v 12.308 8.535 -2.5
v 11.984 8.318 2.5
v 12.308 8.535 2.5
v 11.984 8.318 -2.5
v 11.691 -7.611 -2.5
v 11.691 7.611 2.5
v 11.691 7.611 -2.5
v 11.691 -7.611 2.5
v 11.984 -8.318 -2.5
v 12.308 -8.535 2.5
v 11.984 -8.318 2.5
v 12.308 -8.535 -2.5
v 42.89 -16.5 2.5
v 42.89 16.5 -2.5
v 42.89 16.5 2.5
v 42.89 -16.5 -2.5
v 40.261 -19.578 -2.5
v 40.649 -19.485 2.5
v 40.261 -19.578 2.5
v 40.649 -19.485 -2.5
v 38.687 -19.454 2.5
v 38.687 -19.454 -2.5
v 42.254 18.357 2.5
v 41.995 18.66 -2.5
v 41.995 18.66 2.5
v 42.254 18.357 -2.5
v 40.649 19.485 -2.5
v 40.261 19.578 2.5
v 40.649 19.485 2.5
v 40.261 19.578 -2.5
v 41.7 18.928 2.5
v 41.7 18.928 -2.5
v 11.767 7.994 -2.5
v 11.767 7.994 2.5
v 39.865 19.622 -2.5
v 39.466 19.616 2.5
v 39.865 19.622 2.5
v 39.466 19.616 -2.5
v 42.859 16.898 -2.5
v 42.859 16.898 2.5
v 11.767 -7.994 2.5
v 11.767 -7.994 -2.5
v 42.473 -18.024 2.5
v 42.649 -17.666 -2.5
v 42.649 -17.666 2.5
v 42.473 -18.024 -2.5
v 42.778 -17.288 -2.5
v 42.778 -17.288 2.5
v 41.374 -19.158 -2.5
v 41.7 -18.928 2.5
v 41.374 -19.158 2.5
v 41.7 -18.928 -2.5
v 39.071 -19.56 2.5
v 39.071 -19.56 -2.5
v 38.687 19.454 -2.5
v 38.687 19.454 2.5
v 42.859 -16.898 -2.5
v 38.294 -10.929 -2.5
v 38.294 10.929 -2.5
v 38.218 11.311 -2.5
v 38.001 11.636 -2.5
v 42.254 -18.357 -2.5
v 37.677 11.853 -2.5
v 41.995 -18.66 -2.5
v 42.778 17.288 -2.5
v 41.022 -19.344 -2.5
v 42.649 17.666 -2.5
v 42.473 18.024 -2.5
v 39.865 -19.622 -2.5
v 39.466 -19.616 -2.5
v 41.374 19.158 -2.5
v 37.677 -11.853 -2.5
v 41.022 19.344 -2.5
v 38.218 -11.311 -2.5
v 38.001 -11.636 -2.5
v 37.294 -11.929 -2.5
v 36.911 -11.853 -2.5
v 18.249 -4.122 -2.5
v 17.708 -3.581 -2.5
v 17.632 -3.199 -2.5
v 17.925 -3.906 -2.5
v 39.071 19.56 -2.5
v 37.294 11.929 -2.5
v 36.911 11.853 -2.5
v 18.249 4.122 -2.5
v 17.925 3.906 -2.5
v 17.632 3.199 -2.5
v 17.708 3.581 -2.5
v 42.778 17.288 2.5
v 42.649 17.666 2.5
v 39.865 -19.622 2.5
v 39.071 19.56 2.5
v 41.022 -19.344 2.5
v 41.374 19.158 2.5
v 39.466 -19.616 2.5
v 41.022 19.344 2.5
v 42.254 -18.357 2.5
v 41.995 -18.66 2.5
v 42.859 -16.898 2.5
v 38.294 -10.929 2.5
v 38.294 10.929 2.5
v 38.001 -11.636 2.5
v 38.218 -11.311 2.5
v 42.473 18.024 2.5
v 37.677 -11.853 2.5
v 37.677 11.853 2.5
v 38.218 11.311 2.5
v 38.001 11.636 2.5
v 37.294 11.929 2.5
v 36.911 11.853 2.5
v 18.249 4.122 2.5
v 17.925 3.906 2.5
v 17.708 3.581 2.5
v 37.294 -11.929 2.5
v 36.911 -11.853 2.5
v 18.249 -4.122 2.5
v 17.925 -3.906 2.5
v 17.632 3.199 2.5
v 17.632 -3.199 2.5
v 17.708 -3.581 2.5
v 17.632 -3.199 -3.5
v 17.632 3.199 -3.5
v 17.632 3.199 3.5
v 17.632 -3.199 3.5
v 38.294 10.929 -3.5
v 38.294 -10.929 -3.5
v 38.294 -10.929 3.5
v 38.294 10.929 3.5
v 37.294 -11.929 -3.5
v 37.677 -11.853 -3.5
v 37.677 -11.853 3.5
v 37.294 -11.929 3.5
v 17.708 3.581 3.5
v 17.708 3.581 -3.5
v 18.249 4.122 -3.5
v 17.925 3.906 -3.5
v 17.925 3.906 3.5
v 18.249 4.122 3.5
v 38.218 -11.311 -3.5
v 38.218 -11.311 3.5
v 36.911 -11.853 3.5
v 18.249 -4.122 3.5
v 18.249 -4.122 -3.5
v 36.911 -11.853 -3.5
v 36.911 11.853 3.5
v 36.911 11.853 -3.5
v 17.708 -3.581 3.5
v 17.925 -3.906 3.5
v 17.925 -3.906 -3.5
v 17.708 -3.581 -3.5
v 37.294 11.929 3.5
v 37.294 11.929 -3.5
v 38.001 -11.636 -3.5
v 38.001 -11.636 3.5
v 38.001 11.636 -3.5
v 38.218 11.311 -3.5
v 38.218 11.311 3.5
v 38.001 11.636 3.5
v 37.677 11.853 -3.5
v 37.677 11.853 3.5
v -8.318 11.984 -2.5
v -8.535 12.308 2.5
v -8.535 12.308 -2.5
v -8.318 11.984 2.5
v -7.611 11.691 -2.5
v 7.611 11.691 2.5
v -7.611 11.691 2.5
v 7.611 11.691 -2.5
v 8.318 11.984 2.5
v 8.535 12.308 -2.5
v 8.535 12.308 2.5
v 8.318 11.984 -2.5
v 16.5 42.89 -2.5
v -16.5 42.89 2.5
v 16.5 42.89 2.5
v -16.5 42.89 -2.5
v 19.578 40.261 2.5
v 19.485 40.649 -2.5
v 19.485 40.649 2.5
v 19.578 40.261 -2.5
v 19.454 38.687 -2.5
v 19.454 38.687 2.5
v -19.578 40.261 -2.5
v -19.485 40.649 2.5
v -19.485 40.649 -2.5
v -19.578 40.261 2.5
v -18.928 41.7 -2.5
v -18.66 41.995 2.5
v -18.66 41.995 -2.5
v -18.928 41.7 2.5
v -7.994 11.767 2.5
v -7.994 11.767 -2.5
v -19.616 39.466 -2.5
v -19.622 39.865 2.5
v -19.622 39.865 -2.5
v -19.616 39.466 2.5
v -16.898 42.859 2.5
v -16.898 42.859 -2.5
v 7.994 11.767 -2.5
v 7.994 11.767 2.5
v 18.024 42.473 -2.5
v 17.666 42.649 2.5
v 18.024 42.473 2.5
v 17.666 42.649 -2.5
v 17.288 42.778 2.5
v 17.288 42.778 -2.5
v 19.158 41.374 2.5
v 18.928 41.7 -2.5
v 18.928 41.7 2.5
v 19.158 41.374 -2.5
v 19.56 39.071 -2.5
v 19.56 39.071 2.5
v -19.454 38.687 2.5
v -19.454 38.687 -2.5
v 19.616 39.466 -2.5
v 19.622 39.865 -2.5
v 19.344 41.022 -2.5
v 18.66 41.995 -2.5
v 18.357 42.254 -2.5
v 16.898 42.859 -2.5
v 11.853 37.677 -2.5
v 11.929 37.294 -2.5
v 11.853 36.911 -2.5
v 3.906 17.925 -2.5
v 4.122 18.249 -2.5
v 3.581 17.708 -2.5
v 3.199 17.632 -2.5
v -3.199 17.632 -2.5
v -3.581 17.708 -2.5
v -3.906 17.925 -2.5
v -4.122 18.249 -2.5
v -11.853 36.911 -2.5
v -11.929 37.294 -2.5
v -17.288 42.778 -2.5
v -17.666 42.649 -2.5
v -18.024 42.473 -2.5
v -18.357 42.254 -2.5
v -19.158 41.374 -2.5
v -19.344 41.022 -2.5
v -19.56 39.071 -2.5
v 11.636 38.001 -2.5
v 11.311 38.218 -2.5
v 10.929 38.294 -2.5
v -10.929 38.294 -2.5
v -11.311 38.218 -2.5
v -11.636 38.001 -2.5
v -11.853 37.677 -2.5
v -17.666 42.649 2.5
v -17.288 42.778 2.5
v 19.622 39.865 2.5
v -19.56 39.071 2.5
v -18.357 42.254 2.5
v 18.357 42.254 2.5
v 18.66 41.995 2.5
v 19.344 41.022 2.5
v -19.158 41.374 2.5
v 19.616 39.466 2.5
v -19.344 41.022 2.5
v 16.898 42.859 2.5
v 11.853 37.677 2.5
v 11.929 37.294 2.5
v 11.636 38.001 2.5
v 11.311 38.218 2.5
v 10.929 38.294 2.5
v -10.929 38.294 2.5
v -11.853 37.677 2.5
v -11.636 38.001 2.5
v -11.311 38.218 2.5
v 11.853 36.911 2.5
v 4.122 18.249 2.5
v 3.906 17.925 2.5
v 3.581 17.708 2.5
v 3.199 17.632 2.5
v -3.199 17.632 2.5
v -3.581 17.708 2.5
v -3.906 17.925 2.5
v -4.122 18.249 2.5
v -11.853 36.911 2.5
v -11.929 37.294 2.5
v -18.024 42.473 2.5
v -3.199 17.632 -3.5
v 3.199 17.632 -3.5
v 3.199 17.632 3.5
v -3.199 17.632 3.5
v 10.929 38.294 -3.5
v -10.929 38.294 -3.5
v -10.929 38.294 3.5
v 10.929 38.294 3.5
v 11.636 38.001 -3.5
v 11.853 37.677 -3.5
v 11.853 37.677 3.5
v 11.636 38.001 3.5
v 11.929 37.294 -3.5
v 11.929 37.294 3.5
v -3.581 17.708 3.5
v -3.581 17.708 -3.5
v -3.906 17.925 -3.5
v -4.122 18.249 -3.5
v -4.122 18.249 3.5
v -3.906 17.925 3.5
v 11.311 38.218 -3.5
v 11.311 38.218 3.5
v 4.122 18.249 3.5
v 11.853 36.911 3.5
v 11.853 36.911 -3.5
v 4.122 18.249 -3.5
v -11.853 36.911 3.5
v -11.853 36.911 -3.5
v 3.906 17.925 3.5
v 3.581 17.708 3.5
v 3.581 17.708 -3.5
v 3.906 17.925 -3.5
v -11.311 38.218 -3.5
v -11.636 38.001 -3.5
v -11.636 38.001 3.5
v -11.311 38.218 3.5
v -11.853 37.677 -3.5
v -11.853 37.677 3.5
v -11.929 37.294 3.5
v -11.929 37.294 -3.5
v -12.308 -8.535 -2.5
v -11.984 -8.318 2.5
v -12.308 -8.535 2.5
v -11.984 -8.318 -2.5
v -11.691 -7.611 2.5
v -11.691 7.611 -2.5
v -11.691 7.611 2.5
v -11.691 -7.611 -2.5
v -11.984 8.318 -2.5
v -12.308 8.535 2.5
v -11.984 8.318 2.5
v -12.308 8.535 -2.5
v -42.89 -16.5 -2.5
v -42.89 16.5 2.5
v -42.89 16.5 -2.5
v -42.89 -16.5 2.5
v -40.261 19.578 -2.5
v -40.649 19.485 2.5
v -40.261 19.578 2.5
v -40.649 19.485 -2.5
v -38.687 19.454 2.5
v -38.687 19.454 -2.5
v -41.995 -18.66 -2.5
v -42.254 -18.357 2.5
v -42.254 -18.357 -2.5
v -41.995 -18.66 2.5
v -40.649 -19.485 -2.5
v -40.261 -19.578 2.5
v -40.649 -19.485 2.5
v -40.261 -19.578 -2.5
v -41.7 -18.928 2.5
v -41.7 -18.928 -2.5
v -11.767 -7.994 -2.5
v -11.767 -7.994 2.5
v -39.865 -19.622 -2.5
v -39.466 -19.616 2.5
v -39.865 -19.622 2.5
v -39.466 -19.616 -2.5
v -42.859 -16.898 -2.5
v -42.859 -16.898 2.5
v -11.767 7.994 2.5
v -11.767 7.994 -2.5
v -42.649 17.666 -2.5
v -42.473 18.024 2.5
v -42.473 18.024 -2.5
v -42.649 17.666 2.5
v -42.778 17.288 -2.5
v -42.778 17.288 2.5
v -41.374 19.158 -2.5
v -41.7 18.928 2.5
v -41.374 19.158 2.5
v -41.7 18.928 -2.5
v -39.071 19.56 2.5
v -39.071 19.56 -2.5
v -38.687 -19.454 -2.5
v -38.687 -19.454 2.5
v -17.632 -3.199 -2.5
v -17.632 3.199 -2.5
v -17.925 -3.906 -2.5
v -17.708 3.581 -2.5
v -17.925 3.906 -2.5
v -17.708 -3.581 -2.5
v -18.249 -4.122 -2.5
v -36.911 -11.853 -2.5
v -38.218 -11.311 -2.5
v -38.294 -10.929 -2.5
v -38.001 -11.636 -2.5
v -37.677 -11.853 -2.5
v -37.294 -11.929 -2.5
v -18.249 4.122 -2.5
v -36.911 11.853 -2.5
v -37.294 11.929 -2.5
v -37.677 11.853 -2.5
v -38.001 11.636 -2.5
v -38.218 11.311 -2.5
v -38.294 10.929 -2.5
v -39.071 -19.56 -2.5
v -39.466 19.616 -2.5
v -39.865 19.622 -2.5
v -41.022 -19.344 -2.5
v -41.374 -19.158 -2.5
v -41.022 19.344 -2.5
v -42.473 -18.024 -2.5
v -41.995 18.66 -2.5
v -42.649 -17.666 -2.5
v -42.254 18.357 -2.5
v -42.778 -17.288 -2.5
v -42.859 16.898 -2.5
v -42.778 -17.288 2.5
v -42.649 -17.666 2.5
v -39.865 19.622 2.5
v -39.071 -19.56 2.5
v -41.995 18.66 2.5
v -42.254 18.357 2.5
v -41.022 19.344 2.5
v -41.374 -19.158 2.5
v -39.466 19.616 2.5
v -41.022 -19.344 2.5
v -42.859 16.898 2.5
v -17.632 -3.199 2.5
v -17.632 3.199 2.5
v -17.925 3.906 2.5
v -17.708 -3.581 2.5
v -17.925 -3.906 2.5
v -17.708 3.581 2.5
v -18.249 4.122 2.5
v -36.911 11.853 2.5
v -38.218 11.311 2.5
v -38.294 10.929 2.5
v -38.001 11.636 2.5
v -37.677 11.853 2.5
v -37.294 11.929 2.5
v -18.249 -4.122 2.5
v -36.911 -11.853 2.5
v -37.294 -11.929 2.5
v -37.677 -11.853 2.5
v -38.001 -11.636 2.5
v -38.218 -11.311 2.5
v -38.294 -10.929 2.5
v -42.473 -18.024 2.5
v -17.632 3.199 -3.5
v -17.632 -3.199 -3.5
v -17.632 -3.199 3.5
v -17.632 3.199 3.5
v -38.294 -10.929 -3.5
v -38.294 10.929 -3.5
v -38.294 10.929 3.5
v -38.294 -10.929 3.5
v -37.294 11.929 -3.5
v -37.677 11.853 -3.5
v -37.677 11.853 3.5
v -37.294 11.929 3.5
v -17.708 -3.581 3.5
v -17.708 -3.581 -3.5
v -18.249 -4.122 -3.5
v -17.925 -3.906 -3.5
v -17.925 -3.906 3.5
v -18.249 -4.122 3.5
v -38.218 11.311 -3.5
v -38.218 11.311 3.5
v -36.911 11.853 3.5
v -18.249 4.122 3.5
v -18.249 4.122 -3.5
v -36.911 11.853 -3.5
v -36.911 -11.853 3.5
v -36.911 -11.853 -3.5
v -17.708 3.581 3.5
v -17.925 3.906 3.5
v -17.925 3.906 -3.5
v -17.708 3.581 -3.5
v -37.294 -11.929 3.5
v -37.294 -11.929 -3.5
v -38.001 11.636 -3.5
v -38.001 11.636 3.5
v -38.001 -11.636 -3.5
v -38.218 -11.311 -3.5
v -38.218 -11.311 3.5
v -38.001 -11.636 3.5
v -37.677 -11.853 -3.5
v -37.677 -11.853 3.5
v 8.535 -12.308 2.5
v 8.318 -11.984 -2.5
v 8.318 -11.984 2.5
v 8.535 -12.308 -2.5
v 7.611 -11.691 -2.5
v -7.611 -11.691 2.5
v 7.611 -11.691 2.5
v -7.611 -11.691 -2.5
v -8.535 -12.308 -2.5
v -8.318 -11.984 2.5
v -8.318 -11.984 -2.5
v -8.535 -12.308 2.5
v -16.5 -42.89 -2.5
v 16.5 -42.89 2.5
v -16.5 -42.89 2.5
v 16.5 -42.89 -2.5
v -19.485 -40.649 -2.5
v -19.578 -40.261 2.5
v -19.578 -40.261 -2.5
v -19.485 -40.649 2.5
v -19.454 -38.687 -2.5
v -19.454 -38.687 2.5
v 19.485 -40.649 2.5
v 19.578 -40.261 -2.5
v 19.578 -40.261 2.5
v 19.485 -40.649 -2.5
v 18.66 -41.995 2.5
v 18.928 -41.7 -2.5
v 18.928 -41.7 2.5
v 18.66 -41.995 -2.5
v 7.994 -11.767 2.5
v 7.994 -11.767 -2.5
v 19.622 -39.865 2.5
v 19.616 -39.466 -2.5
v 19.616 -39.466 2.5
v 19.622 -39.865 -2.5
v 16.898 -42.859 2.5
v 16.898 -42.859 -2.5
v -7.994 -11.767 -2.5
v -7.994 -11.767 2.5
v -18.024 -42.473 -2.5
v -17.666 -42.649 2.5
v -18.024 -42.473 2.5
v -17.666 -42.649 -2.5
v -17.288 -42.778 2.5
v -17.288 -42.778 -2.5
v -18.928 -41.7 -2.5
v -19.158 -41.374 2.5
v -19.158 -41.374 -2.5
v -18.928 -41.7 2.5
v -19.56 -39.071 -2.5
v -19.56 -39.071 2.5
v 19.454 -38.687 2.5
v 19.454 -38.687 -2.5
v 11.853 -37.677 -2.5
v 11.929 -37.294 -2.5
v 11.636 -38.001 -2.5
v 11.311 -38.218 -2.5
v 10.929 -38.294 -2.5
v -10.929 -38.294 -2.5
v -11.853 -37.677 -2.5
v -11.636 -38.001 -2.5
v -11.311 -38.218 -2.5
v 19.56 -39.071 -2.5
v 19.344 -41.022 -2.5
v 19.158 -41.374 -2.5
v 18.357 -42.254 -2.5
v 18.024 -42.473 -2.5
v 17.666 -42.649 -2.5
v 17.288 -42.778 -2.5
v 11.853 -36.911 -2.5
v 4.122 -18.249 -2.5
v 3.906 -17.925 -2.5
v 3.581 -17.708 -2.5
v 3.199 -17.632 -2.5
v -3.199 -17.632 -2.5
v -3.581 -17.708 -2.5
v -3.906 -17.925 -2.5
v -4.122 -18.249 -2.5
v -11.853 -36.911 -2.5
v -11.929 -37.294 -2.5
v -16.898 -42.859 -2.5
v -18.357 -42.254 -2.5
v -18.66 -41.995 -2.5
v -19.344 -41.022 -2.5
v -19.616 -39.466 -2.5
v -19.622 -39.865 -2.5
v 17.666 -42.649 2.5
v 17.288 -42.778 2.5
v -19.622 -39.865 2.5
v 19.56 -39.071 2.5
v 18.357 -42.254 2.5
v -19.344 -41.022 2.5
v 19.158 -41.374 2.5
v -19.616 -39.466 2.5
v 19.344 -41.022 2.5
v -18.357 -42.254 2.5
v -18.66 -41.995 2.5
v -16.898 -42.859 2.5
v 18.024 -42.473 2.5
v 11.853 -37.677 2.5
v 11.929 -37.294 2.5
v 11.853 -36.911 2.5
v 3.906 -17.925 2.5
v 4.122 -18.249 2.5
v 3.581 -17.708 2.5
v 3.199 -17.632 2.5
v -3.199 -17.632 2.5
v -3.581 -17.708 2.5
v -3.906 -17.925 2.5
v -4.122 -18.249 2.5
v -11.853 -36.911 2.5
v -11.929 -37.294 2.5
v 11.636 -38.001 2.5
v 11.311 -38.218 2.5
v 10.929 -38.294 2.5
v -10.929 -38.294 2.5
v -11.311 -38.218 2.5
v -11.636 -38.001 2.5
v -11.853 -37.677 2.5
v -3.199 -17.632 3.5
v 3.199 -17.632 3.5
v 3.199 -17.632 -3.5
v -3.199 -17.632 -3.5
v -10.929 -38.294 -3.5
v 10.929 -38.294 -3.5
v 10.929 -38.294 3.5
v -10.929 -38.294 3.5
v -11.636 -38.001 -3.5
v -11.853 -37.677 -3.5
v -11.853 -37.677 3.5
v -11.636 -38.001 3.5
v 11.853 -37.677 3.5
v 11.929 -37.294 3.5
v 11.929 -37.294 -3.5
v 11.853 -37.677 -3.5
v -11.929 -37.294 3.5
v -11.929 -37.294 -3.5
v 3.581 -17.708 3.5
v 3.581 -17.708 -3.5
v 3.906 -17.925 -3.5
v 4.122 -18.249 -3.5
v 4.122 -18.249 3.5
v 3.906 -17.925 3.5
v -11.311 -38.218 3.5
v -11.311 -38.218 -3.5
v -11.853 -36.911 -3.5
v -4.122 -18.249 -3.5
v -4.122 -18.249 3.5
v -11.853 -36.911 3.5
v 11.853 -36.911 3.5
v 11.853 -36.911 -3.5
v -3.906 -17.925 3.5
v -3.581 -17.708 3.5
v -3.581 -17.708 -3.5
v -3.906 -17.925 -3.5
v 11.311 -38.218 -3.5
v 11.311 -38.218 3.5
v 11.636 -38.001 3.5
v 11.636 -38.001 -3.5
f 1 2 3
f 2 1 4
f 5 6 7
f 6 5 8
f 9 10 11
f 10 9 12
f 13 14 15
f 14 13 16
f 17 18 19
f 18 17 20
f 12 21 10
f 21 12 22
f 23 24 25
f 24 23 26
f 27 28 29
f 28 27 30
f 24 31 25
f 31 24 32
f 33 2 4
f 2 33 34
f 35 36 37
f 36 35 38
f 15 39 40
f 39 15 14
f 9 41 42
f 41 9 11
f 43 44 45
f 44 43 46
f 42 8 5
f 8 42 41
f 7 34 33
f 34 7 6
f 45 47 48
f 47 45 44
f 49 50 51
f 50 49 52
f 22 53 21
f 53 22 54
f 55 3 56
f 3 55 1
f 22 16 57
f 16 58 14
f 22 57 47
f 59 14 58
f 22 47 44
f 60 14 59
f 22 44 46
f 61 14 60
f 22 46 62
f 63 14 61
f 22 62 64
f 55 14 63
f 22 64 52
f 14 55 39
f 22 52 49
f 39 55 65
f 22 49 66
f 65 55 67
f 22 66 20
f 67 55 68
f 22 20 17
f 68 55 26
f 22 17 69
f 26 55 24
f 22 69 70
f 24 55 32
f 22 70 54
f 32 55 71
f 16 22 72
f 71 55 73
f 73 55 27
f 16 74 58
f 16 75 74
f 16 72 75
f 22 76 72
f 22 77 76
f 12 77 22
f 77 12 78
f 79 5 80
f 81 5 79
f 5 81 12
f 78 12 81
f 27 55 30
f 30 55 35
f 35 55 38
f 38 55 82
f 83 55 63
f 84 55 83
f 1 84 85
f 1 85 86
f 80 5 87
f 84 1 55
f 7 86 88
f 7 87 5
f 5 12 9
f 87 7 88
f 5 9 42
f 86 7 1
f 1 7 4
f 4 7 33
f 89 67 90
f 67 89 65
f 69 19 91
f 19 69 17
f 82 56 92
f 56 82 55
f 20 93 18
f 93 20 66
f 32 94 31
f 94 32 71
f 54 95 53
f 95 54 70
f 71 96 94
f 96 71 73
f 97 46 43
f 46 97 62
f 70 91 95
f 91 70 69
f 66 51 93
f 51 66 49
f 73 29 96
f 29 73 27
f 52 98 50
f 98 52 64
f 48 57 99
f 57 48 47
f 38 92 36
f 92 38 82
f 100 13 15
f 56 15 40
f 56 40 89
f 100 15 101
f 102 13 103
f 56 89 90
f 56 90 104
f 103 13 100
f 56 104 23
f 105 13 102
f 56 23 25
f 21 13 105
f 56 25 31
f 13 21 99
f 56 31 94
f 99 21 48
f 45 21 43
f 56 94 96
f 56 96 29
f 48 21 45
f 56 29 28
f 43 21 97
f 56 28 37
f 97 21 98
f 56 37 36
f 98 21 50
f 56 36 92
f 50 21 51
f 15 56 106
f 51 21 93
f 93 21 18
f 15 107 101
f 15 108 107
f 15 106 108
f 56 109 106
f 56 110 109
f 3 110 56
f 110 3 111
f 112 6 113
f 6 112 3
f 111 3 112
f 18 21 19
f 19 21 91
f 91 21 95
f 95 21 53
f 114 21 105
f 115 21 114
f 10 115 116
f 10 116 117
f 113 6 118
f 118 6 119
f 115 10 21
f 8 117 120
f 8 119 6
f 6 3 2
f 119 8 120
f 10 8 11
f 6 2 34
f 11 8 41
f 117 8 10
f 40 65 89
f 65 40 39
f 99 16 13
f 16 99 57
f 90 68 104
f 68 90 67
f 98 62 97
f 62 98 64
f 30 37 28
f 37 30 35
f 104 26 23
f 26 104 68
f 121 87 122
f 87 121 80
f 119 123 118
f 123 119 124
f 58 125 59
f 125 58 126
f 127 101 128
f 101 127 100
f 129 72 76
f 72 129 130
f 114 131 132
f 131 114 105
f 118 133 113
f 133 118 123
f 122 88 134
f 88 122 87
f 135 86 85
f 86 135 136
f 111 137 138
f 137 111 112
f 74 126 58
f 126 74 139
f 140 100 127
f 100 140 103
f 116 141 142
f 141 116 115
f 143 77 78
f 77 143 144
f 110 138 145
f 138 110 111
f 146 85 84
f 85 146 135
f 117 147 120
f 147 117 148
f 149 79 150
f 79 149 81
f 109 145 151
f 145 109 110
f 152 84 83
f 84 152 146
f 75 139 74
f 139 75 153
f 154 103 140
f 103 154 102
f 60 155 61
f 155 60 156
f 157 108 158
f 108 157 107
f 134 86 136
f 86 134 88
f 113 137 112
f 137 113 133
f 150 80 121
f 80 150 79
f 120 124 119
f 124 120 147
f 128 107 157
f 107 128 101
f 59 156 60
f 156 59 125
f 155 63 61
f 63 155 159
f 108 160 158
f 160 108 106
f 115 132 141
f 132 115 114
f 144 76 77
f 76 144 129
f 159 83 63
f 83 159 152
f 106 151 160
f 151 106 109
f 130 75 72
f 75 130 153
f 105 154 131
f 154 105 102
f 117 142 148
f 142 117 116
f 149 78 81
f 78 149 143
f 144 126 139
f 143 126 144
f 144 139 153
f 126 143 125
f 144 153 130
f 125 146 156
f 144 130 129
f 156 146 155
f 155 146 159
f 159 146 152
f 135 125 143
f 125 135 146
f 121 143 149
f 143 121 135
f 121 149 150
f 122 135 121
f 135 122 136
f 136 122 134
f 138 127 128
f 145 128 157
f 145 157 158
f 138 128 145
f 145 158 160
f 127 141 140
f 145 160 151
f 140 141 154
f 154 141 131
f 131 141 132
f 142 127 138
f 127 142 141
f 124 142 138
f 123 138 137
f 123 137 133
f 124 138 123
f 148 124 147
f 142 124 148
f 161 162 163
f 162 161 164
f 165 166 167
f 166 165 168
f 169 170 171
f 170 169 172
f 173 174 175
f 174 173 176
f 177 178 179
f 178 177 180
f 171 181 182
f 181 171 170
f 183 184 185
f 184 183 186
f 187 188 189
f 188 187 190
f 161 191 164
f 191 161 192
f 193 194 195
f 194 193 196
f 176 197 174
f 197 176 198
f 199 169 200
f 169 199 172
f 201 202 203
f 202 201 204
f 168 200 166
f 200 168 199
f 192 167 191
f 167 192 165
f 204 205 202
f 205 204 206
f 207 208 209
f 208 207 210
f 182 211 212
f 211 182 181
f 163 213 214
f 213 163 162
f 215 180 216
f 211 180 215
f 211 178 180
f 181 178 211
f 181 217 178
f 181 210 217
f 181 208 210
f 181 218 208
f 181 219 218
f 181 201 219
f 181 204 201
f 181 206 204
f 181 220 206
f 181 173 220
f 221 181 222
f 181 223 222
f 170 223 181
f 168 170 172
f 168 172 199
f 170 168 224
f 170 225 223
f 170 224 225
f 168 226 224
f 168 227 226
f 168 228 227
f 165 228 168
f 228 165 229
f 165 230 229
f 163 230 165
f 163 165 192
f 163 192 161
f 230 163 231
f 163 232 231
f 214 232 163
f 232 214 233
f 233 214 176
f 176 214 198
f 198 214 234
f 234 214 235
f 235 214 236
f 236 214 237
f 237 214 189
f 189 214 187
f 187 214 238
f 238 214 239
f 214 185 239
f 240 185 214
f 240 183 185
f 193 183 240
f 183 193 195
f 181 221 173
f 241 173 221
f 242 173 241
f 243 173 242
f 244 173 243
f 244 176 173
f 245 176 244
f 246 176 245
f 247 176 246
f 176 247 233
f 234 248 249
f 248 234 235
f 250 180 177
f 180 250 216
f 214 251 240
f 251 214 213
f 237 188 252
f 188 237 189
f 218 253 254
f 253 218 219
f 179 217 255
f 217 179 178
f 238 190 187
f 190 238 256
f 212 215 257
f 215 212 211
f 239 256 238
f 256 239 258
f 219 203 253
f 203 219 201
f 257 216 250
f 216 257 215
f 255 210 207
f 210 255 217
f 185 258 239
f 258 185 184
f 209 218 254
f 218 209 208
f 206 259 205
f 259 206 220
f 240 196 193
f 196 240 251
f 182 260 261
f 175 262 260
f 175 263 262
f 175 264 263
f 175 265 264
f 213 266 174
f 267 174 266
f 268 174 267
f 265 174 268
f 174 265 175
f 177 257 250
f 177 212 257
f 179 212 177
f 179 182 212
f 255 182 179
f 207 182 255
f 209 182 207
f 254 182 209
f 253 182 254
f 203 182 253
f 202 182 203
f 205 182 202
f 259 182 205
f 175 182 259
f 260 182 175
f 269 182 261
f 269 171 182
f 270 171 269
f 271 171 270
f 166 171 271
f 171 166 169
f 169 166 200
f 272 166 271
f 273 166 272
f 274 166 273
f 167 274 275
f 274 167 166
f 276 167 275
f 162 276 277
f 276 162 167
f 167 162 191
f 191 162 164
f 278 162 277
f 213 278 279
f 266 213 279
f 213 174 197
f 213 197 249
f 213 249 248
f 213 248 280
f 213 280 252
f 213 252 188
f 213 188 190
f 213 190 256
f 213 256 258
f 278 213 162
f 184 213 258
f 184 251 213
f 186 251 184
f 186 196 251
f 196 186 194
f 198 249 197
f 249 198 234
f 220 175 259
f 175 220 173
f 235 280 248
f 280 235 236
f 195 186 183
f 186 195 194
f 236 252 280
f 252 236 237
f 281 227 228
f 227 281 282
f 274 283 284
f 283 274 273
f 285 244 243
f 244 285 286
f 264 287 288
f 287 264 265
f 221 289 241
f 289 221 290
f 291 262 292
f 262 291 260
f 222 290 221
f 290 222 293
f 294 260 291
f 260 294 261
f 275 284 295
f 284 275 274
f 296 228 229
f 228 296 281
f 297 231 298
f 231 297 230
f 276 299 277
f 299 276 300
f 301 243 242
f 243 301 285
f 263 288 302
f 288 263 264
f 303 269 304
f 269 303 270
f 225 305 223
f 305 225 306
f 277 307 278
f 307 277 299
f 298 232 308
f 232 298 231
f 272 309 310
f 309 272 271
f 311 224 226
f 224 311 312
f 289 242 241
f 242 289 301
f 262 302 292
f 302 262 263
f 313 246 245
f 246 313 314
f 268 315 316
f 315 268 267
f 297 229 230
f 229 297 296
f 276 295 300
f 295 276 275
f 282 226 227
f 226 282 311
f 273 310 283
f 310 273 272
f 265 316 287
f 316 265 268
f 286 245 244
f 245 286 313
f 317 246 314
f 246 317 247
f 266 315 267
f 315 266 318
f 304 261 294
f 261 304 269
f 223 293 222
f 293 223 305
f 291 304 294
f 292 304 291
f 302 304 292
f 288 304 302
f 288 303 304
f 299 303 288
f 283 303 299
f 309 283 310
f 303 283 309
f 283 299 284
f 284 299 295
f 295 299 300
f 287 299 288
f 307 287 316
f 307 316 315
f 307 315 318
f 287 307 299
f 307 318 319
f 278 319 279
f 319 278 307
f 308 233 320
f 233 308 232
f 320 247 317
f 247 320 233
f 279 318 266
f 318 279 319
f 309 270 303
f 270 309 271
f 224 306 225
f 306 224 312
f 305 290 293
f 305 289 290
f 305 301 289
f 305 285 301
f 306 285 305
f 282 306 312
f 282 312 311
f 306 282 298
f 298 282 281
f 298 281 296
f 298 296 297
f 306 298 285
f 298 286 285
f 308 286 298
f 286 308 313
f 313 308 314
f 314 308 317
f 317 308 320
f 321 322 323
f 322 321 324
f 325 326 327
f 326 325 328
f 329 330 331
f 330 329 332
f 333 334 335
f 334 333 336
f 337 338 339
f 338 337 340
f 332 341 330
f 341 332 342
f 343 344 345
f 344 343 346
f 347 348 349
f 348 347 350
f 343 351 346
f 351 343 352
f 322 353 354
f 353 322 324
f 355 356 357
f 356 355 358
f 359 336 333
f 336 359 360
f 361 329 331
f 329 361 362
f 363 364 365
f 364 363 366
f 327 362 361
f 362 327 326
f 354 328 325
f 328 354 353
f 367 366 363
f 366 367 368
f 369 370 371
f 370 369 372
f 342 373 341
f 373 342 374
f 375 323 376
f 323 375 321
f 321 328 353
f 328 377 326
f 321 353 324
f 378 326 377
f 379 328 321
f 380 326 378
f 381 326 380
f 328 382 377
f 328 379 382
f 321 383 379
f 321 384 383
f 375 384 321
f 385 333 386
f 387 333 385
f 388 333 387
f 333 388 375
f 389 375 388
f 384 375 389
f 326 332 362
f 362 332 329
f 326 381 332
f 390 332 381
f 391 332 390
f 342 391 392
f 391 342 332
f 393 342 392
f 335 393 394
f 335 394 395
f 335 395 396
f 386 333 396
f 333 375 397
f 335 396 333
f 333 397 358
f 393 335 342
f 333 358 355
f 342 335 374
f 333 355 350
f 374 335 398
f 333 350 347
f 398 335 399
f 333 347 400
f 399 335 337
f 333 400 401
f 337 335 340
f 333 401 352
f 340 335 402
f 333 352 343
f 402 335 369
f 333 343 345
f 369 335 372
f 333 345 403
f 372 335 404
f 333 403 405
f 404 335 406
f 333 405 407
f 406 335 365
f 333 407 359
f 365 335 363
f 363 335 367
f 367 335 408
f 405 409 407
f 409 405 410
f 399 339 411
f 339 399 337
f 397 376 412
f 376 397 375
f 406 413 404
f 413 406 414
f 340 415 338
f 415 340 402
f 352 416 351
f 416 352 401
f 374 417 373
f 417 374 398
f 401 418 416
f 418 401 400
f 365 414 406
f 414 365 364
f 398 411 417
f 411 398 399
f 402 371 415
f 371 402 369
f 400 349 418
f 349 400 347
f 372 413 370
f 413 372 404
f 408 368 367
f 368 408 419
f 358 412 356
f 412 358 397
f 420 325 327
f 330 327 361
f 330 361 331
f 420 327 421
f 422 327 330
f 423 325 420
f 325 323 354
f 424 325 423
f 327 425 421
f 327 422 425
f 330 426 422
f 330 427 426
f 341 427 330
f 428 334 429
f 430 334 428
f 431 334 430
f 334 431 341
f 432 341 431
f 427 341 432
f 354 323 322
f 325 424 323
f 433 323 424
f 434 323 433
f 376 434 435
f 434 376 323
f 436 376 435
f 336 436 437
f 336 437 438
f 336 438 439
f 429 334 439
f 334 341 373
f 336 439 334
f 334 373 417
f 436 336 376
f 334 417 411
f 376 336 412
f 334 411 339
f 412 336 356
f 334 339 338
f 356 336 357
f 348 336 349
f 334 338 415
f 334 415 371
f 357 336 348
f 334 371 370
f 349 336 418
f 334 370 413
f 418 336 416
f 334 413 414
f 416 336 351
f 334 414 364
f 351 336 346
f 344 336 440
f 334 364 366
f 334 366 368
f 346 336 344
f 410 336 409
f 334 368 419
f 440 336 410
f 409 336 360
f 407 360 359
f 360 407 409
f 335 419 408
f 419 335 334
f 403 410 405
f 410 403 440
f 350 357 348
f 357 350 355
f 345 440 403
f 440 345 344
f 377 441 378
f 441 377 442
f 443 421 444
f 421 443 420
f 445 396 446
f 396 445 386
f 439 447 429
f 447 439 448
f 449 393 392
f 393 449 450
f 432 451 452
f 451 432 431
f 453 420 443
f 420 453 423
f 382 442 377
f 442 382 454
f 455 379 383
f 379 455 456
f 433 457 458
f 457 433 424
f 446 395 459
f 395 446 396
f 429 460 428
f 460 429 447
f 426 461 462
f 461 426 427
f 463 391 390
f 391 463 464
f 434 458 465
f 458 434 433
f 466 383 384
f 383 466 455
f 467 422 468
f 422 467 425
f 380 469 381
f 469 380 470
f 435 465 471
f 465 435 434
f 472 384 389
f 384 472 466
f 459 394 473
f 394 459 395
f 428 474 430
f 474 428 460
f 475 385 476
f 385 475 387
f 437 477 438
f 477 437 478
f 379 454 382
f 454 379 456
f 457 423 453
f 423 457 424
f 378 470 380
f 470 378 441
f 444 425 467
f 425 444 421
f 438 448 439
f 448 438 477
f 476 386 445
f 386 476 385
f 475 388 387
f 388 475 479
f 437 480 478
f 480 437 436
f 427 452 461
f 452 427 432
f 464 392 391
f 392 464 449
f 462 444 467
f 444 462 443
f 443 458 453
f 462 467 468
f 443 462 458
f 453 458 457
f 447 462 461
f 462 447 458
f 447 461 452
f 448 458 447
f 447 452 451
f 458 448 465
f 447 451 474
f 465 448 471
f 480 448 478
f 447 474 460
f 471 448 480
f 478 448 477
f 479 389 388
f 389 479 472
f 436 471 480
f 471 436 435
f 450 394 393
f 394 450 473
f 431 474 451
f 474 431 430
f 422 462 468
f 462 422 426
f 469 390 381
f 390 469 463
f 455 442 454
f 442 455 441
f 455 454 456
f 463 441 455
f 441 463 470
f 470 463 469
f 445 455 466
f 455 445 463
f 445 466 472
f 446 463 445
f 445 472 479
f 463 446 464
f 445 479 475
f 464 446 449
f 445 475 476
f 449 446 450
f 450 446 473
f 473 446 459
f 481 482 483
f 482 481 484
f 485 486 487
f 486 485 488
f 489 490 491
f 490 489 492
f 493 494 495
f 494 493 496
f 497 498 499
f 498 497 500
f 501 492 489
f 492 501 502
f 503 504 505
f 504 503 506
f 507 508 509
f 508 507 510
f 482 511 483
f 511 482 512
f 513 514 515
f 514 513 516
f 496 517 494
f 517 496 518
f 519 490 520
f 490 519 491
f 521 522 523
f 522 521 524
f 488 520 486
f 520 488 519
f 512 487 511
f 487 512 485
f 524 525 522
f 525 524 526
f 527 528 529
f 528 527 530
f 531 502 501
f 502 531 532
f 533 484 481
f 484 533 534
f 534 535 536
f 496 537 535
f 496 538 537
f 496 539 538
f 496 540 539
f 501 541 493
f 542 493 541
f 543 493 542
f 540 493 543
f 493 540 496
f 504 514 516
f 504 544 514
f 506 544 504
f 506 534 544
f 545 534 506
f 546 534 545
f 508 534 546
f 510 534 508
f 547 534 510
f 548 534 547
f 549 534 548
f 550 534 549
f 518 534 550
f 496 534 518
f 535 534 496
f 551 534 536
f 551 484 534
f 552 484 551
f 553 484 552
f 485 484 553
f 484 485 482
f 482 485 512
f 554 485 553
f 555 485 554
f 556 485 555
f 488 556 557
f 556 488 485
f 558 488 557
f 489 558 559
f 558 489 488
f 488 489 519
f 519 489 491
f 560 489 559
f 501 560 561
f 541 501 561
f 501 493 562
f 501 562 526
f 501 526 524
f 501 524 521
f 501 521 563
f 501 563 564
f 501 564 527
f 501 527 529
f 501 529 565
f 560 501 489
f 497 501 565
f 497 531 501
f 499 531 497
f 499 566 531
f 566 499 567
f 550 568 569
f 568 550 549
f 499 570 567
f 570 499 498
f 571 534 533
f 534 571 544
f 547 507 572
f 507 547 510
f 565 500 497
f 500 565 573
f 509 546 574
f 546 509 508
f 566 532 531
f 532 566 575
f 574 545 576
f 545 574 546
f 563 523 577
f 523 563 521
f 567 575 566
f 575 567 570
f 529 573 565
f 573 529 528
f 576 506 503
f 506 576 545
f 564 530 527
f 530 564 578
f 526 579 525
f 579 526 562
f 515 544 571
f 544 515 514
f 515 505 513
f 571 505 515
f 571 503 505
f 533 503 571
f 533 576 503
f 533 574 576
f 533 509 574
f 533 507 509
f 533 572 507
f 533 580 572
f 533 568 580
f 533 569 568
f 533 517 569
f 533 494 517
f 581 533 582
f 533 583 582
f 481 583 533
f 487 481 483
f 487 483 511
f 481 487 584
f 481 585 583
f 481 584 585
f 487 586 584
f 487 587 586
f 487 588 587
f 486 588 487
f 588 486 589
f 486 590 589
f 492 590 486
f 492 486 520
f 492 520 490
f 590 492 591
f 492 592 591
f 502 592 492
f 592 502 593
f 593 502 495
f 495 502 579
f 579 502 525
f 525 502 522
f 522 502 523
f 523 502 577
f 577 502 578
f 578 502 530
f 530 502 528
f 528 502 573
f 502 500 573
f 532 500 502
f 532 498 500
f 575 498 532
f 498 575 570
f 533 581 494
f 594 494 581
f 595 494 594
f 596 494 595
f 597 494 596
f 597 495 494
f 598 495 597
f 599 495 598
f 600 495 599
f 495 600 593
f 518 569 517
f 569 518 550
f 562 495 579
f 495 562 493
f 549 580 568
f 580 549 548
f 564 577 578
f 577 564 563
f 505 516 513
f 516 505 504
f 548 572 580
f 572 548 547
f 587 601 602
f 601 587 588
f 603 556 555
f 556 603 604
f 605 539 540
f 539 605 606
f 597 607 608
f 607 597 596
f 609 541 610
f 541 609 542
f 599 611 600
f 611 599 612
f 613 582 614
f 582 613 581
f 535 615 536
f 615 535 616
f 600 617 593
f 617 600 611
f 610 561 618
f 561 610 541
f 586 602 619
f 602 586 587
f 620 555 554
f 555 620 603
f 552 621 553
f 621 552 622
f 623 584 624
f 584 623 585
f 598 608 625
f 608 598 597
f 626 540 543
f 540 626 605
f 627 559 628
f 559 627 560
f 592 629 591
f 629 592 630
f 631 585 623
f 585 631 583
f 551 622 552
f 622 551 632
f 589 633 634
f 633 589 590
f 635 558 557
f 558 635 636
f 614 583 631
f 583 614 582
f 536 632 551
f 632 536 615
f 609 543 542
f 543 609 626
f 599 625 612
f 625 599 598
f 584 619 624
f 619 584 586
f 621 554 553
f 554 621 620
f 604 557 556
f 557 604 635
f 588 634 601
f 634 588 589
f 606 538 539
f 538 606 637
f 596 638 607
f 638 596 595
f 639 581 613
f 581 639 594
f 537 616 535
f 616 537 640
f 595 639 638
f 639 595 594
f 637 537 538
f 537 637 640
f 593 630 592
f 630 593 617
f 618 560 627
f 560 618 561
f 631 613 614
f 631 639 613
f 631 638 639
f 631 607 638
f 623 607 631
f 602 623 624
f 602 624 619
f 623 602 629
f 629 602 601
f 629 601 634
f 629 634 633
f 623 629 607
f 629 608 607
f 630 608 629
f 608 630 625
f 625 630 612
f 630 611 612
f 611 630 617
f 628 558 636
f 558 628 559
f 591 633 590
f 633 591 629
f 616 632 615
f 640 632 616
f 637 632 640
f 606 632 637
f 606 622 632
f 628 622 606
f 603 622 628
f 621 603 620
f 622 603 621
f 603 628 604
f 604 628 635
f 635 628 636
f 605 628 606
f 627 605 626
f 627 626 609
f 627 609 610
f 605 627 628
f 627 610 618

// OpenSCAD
include <MCAD/bearing.scad>

// ---------------------------
// Constants
// ---------------------------
$fa = 1;
$fs = 0.4;
in_to_mm = 25.4;
gap = 1.25; //1/32 * in_to_mm;
nut_gap = 7;//3/4 * in_to_mm;
eps = .2;

bearingModel = 688; //608
bearing_w = bearingWidth(bearingModel);
bearing_or = bearingOuterDiameter(bearingModel)/2;
bearing_ir = bearingInnerDiameter(bearingModel)/2;

// ---------------------------
// Variables
// ---------------------------
num_holes=8;
sectors = num_holes;
sector_degrees = 360 / sectors;

mag1_hole_d = (1/4 * in_to_mm);
mag1_hole_r = (mag1_hole_d/2);
mag1_w = 1/4 * in_to_mm;

mag2_hole_d = (1/8 * in_to_mm);
mag2_hole_r = (mag2_hole_d/2);
mag2_w = 1/4 * in_to_mm;

mag_space_1 = 3;
mag_space_2 = 2;

cir = num_holes*2*(mag1_hole_d-mag_space_2/2);
temp_r = cir/(3.14159*2);
min_r = bearing_or + mag1_hole_d + mag2_hole_d + mag_space_2+2;
central_r3 = max(temp_r, min_r);
central_r2 = central_r3 + mag2_hole_r + mag_space_2 + mag2_hole_r;
central_r = central_r2 + mag2_hole_r + mag_space_1 + mag1_hole_r;
disk_r = central_r+2;

coil_w = bearing_w;//5;//(1/8 * in_to_mm = 3.175);
coil_hole_r = mag1_hole_r*3;
coil_hole_d = coil_hole_r*2;
coil_holder_r = mag1_hole_r;
coil_holder_bolt_r = 2;
coil_center_hole_r = bearing_or+.2; //7

coil_holder_hull_r = 1;
coil_holder_out_r1 = central_r3-mag1_hole_r-mag2_hole_r-mag_space_2;
coil_holder_out_x1 = coil_holder_out_r1-coil_holder_hull_r/num_holes;
coil_holder_out_y1 = mag1_hole_r-coil_holder_hull_r;
coil_holder_out_r2 = central_r+mag1_hole_d+mag_space_1;
coil_holder_out_x2 = coil_holder_out_r2+mag1_hole_r-coil_holder_hull_r*4;
coil_holder_out_y2 = mag1_hole_r-coil_holder_hull_r;

coil_holder_in_x1 = coil_holder_out_r1+mag1_hole_r+coil_holder_hull_r/2;
coil_holder_in_y1 = mag1_hole_r+coil_holder_hull_r;
coil_holder_in_x2 = coil_holder_out_r2-mag1_hole_r-coil_holder_hull_r*2;
coil_holder_in_y2 = mag1_hole_r+coil_holder_hull_r;
coil_holder_in_len = coil_holder_in_x2 - coil_holder_in_x1 + coil_holder_hull_r*2;
echo(str("coil_holder_in_len:", coil_holder_in_len));

base_d = 100;
base_r = base_d/2;  //central_r + coil_hole_d;
base_w = 3; //bearing_w/1.75
base_l = 70; //3.5 * in_to_mm; 66.4
base_lc = nut_gap + gap + mag2_w + gap + coil_w +gap + mag1_w + gap + coil_w + gap + mag1_w + gap + coil_w + gap + mag2_w + gap + nut_gap;
base_side_h = 15;
alignment_bolt_r = 3.9/2;

axel_h = gap+coil_w+gap;
axel_ir = bearing_ir+.1;
axel_or = coil_center_hole_r-1;

echo(str("sector_degrees:", sector_degrees));
echo(str("coil_w:", coil_w));
echo(str("bearing_w:", bearing_w));
echo(str("mag1_w:", mag1_w));
echo(str("mag1_hole_r:", mag1_hole_r));
echo(str("mag2_hole_r:", mag2_hole_r));
echo(str("coil_hole_r:", coil_hole_r));
echo(str("coil_holder_r:", coil_holder_r));
echo(str("axel_h:", axel_h));
echo(str("axel_ir:", axel_ir));
echo(str("base_lc:", base_lc));

//translate([0,0, mag1_w/2+2]) coilHoldersVisual();
//translate([0,0, -mag1_w]) mag1Disk();
//coilDisk();
//coilHolder();
//baseEndCap();
//baseBottom();
//generatorBase();
//alignmentBoltHoles();
//baseEndCap2();
//baseBottom();
%coilDisk2();
inv_num_holes = 1/num_holes;
tmp_t = inv_num_holes*2; //0=blue, 1=white, 2=yellow, 3=green
rotate([0,0,(-sector_degrees/(num_holes/2))*$t*num_holes]) {
//rotate([0,0,(-sector_degrees/(num_holes/2))*tmp_t*num_holes]) {    
    %mag1Disk();
}


tr1=inv_num_holes*1;//3/num_holes;//0.0;//0.125;
color( "yellow", 1.0 ) {
rotate([0,0,(-sector_degrees/2)*tr1*num_holes]) {    
    for(sector = [0 : 2 : sectors]) {
        rotate([0,0,sector_degrees*sector]) { 
            outerCoilHolder();
            #innerCoilHolder(w=coil_w+2);
        }
    }    
}
}
//tr2=inv_num_holes*0.5;
//color( "white", 1.0 ) {
//rotate([0,0,(-sector_degrees/2)*tr2*num_holes]) {    
//    for(sector = [0 : 2 : sectors]) {
//        rotate([0,0,sector_degrees*sector]) { 
//            outerCoilHolder();
//            #innerCoilHolder(w=coil_w+2);
//        }
//    }    
//}
//}
//tr3=inv_num_holes*2;
//color( "blue", 1.0 ) {
//rotate([0,0,(-sector_degrees/2)*tr3*num_holes]) {    
//    for(sector = [0 : 2 : sectors]) {
//        rotate([0,0,sector_degrees*sector]) { 
//            outerCoilHolder();
//            #innerCoilHolder(w=coil_w+2);
//        }
//    }    
//}
//}
//tr4=inv_num_holes*1.5;
//color( "green", 1.0 ) {
//rotate([0,0,(-sector_degrees/2)*tr4*num_holes]) {    
//    for(sector = [0 : 2 : sectors]) {
//        rotate([0,0,sector_degrees*sector]) { 
//            outerCoilHolder();
//            #innerCoilHolder(w=coil_w+2);
//        }
//    }    
//}
//}

// Outer coil holder
module outerCoilHolder(w=coil_w) {
    hull() {
        translate([coil_holder_out_x1, -coil_holder_out_y1, 0])
        cylinder(h=w,r=coil_holder_hull_r,center=true);
        translate([coil_holder_out_x2, 0, 0])
        cylinder(h=w,r=mag1_hole_r,center=true);

        rotate([0,0,sector_degrees]) {
        translate([coil_holder_out_x1, coil_holder_out_y1, 0])
        cylinder(h=w,r=coil_holder_hull_r,center=true);
        translate([coil_holder_out_x2, 0, 0])
        cylinder(h=w,r=mag1_hole_r,center=true);
        }
    }
}


// Inner coil holder
module innerCoilHolder(w=coil_w) {
    hull() {
        translate([coil_holder_in_x1, coil_holder_in_y1, 0])
        cylinder(h=w,r=coil_holder_hull_r,center=true);
        translate([coil_holder_in_x2, coil_holder_in_y2, 0])
        cylinder(h=w,r=coil_holder_hull_r,center=true);

        rotate([0,0,sector_degrees]) {
        translate([coil_holder_in_x1, -coil_holder_in_y1, 0])
        cylinder(h=w,r=coil_holder_hull_r,center=true);
        translate([coil_holder_in_x2, -coil_holder_in_y2, 0])
        cylinder(h=w,r=coil_holder_hull_r,center=true);
        }
    }
}




render_mode = "JOE"; //"FULL", "PRINT", "TEST";
print_mode = "COIL"; //"MAG1","MAG2","COIL","BASE", "BOTTOM", "END","AXEL","HOLDERS";

// Main rendering code
if (render_mode=="FULL") {
    renderFull();
} else if (render_mode=="PRINT") {
    renderPrint();
} else if (render_mode=="TEST") {
    renderTest();
}

module renderFull() {
    x_offset_1 = coil_w/2 + gap + mag1_w/2;
    x_offset_2 = x_offset_1 + mag1_w/2 + gap + coil_w/2;
    x_offset_3 = x_offset_2 + coil_w/2 + gap + mag2_w/2;
    z_offset = base_r+base_w/2;
    translate([0,0,0]) {
        // Base
        translate([0,0,0])
            generatorBase();
        
        // Rotating Magnet2 Disk 1
        translate([-x_offset_3,0,z_offset])
            rotate([0,90,0])mag2Disk();
        // Axel
        translate([-x_offset_2,0,z_offset])
            rotate([0,90,0])axel();
        // Coil Disk 1
        translate([-x_offset_2,0,z_offset])rotate([0,90,0])
            coilDisk();
        
        // Rotating Magnet1 Disk 1
        translate([-x_offset_1,0,z_offset])
            rotate([0,90,0])mag1Disk();
        // Axel
        translate([0,0,z_offset])
            rotate([0,90,0])axel();
        // Coil Disk 2
        translate([0,0,z_offset])rotate([0,90,0])
            coilDisk();
        // Rotating Magnet1 Disk 2
        translate([x_offset_1,0,z_offset])
            rotate([0,90,0])mag1Disk();
        
        // Rotating Magnet2 Disk 2
        translate([x_offset_3,0,z_offset])
            rotate([0,90,0])mag2Disk();
        // Axel
        translate([x_offset_2,0,z_offset])
            rotate([0,90,0])axel();
        // Coil Disk 3
        translate([x_offset_2,0,z_offset])rotate([0,90,0])
            coilDisk();
        
    }
}

module renderPrint() {
    if (print_mode=="MAG1") {
        // Magnet Disk1
        mag1Disk();
    } else if (print_mode=="MAG2") {
        // Magnet Disk2
        mag2Disk();
    } else if (print_mode=="COIL") {
        // COIL Disk
        coilDisk();
    } else if (print_mode=="BASE") {
        // Base
        generatorBase();
    } else if (print_mode=="BOTTOM") {
        // Base Bottom
        baseBottom();
    } else if (print_mode=="END") {
        // Base End Cap
        baseEndCap2();
    } else if (print_mode=="AXEL") {
        // Axel
        axel();
    } else if (print_mode=="HOLDERS") {
        // Wire coil holders
        for(x = [-1.5 : 1.5]) {
            translate([x*coil_hole_r*2.1,0,0])coilHolder();
        }
    }
}

module generatorBase(w=base_w, l=base_l) {
    //Bottom
    baseBottom(w, l);
    //End Caps
    translate([l/2-w/2,0,base_r+w/2])rotate([180,-90,0])baseEndCap(w);
    translate([-l/2+w/2,0,base_r+w/2])rotate([0,-90,0])baseEndCap(w);
}

module baseBottom(w=base_w, l=base_l, d=base_d, h=base_side_h) {
    //Bottom
    translate([0,0,0])cube([l, d, w], center=true);
    //Sides
    translate([0,base_r+w/2,h/2-w/2])cube([l, w, h], center=true);
    translate([0,-base_r-w/2,h/2-w/2])cube([l, w, h], center=true);
}

module baseEndCap(w=base_w) {
    b_sup_x = base_d/2+w;
    b_sup_y = (bearing_or+2)*2;
    b_sup_z = bearing_w-2;
    difference() {
        union() {
            cube([base_d, base_d+w*2, w], center=true);
            // bearing support
            translate([-b_sup_x/2,0,b_sup_z/2])
                cube([b_sup_x, b_sup_y, b_sup_z], center=true);
            translate([0,0,b_sup_z/2])
                cylinder(h=b_sup_z,r=b_sup_y/2,center=true);
        }
        
        // remove center hole for bearing
        bearing(pos=[0,0,-1],model=bearingModel,outline=true);
        cylinder(h=w*2,r=bearing_or-1,center=true);
        alignmentBoltHoles(w=w);
    }
    if (render_mode == "FULL") {
        bearing(pos=[0,0,-1],model=bearingModel,outline=false);
    }
}

module baseEndCap2(w=base_w) {
    b_sup_x = base_d/2+w;
    b_sup_y = (bearing_or+2)*2;
    b_sup_z = bearing_w-2;
    difference() {
        union() {
            cube([base_d, base_d+w*2, w], center=true);
            translate([-base_d/2-w/2,0,0])
                cube([w, base_d+w*2, w], center=true);
            // bearing support
//            translate([-b_sup_x/2,0,b_sup_z/2])
//                cube([b_sup_x, b_sup_y, b_sup_z], center=true);
            translate([0,0,b_sup_z/2])
                cylinder(h=b_sup_z,r=b_sup_y/2,center=true);
        }
        
        // remove center hole for bearing
        bearing(pos=[0,0,-1],model=bearingModel,outline=true);
        cylinder(h=w*2,r=bearing_or-1,center=true);
        alignmentBoltHoles(w=w);
    }
    if (render_mode == "FULL") {
        bearing(pos=[0,0,-1],model=bearingModel,outline=false);
    }
}


// Stationary Disk with coils
module coilDisk(w=coil_w, wires=true) {
    x = base_d-1.5;
    y = x;
    small_hole_r = 1;
    small_hole_or = central_r+coil_hole_r;
    // Disk
    difference() {
        //main structure
        cube([x, y, w], center=true);
        // remove holes for coils
        coilHolderHoles();
        // remove center hole for bearing
        cylinder(h=w*2,r=coil_center_hole_r,center=true);
        // remove holes for wires
        if (wires == true) {
            wireChannelsStraight();
            structureHoles(w=w,radius=small_hole_or, hole_r=small_hole_r);
        }
        alignmentBoltHoles(w=w);
    }
}

// Stationary Disk with trap coils
module coilDisk2(w=coil_w, wires=true) {
    x = base_d-1.5;
    y = x;
    small_hole_r = 1;
    small_hole_or = central_r+mag1_hole_d+coil_hole_r;
    // Disk
    difference() {
        //main structure
        cube([x, y, w], center=true);
        //remove trap for coils
        // remove center hole for bearing
        cylinder(h=w*2,r=coil_center_hole_r,center=true);
        // remove holes for wires
        if (wires == true) {
            wireChannelsStraight();
            structureHoles(w=w,radius=small_hole_or, hole_r=small_hole_r);
        }
        alignmentBoltHoles(w=w);
    }
}

// Stationary Disk with trap coils and hex supports
module coilDisk3(w=coil_w, wires=true) {
    x = base_d-1.5;
    y = x;
    small_hole_r = 1;
    small_hole_or = central_r+mag1_hole_d+coil_hole_r;
    // Disk
    difference() {
        //main structure
        //cylinder(h=w,r=disk_r,center=true);
        cube([x, y, w], center=true);
        //remove trap for coils
        //rotate([0,0,30])
        #hexSupports(w=coil_w*2, supp_w=mag1_hole_d, supp_l=25, radius=central_r2+mag_space_2);
        // remove center hole for bearing
        cylinder(h=w*2,r=coil_center_hole_r,center=true);
        // remove holes for wires
        if (wires == true) {
            wireChannelsStraight();
            structureHoles(w=w,radius=small_hole_or, hole_r=small_hole_r);
        }
        alignmentBoltHoles(w=w);
    }
}

//alignment_bolt_r
module alignmentBoltHoles(w=coil_w, r=alignment_bolt_r, i=10) {
    translate([base_r-i,base_r-i,0])cylinder(h=w*2,r=r,center=true);
    translate([-base_r+i,base_r-i,0])cylinder(h=w*2,r=r,center=true);
    translate([base_r-i,-base_r+i,0])cylinder(h=w*2,r=r,center=true);
    translate([-base_r+i,-base_r+i,0])cylinder(h=w*2,r=r,center=true);
}

module wireChannelsStraight() {
    radius = central_r+mag1_hole_d;
    sectors = num_holes/2;
    degrees = 360 / sectors;
    cyl_h = radius*(12/num_holes)-2;
    
    for(sector = [1 : sectors]) {
        angle = degrees * sector;
        x_pos = radius * sin(angle);
        y_pos = radius * cos(angle);
        x_off = (coil_hole_r) * cos(angle);
        y_off = (coil_hole_r) * sin(angle);
        cross_angle_1 = degrees/2-(angle+90);
        cross_angle_2 = degrees/2-(angle+degrees-90);
        rotate([0,0,degrees/2]) {
            translate([x_pos+y_off,y_pos+x_off,coil_w/2]){
                rotate([90,0,cross_angle_1])cylinder(h=cyl_h,r=coil_w/4,center=false);
            }
        }
        rotate([0,0,degrees/2]) {
            translate([x_pos+y_off,y_pos+x_off,coil_w/2]){
                rotate([90,0,cross_angle_2])cylinder(h=cyl_h,r=coil_w/4,center=false);
            }
        }
    }    
}

// Rotating Disk with magnets #1
module mag1Disk(w=mag1_w) {
    border = mag1_hole_r*1.5;
    mag1_disk_r = central_r + border;
    
    // Disk
    difference() {
        cylinder(h=w,r=mag1_disk_r,center=true);
        //remove holes for outer magnets
        holes(w*2, mag1_hole_r+eps);
        //remove holes for center magnets
        holes(w*2, mag2_hole_r+eps, radius=central_r2);
        //remove holes for inner magnets
        holes(w*2, mag2_hole_r+eps, radius=central_r3);
        //remove hole for main axel
        cylinder(h=w*2,r=axel_ir,center=true);
    }
}

// Rotating Disk with magnets #2
module mag2Disk(w=mag2_w) {
    border = mag2_hole_r*2;
    mag2_disk_r = central_r + border;
    
    // Disk
    difference() {
        cylinder(h=w,r=mag2_disk_r,center=true);
        //remove holes for outer magnets
        holes(w*2, mag2_hole_r+eps);
        //remove hole for main axel
        cylinder(h=w*2,r=axel_ir,center=true);
    }
}

// Coil Holders Visual
module coilHoldersVisual(w=coil_w) {
    step = 0;
    step_inc = (180/num_holes);
    rot = step_inc*step;
    rotate([0,0,rot]) {
        coilHolders();
    }
}

module coilHolders(radius=central_r) {
    sectors = num_holes/2;
    sector_degrees = 360 / sectors;
    for(sector = [1 : sectors]) {
        angle = sector_degrees * sector;
        x_pos = radius * sin(angle);
        y_pos = radius * cos(angle);
        translate([x_pos,y_pos,0]){
            #coilHolder(top=false);
        }
    }    
}

module coilHolderHoles(radius=central_r) {
    sectors = num_holes/2;
    sector_degrees = 360 / sectors;
    for(sector = [1 : sectors]) {
        angle = sector_degrees * sector;
        x_pos = radius * sin(angle);
        y_pos = radius * cos(angle);
        translate([x_pos,y_pos,0]){
            coilHolderHole();
        }
    }    
}

module coilHolderHole() {
    cylinder(h=coil_w+2,r=coil_hole_r+.1,center=true);
}

// Coil Holder
module coilHolder(h1=.65, h2=coil_w, r1=coil_hole_r, r2=coil_holder_r, top=true) {
    r1e = r1-.2;
    r2e = r2+1;
    if (top == true) {
        translate([0,-r1-1,0])
            coilHolderBot(h1,h2,r1e,r2e);
        translate([0,r1+1,0])rotate([180,0,0])
            coilHolderTop(h1,r1e);
    } else {
        coilHolderBot(h1,h2,r1e,r2e);
    }
}

module coilHolderBot(h1,h2,r1,r2) {
    wire_holder_r = 1;
    difference() {
        union() {
            //Base
            cylinder(h=h1,r=r1,center=false);
            //Post
            cylinder(h=h2-h1,r=r2,center=false);
        }
        //remove bolt hole
        translate([0,0,-h2/2])cylinder(h=h2*2,r=coil_holder_bolt_r,center=false);
        //remove wire holder hole
        translate([0,r1-wire_holder_r/2,0])rotate([0,0,0])
            cylinder(h=h1*4,r=wire_holder_r,center=true);
    }
}

module coilHolderTop(h1,r1) {
    rotate([180,0,0]) {
        difference() {
            //Base
            cylinder(h=h1,r=r1,center=false);
            //remove hole for bolt
            cylinder(h=h1*3,r=coil_holder_bolt_r,center=true);
        }
    }
}

module axel() {
    hollowCyl(h=axel_h,or=axel_or,ir=axel_ir);
}

module hollowCyl(h,or,ir) {
    difference() {
        cylinder(h=h,r=or,center=true);
        cylinder(h=h*2,r=ir,center=true);
    }
}

module holes(w, hole_r, radius=central_r) {
    //radius = central_r;
    sectors = num_holes;
    sector_degrees = 360 / sectors;

    for(sector = [1 : sectors]) {
        angle = sector_degrees * sector;
        x_pos = radius * sin(angle);
        y_pos = radius * cos(angle);
        translate([x_pos,y_pos,0]){
            hole(w, hole_r);
        }
    }    
}

module structureHoles(w, radius, hole_r, sectors=num_holes) {
    sector_degrees = 360 / sectors;
    for(sector = [1 : 2 : sectors]) {
        angle = sector_degrees * sector;
        x_pos = radius * sin(angle);
        y_pos = radius * cos(angle);
        translate([x_pos,y_pos,0]){
            hole(w, hole_r);
        }
    }    
}

module hole(w, hole_r) {
    cylinder(h=w+2,r=hole_r,center=true);
}

module trapCoilHolderBase() {
    cylinder(coil_w,r=central_r,center=true);
}

module hexSupports(w=coil_w, supp_w, supp_l=24, radius=disk_r) {
    // Create supports for bearing holder
    sectors = num_holes;
    sector_degrees = 360 / sectors;

    for(sector = [1 : sectors]) {
        angle = sector_degrees * sector;
        x_pos = radius * sin(angle);
        y_pos = radius * cos(angle);
        translate([x_pos,y_pos,0]){
            rotate([0,0,-angle])cube([supp_w,supp_l,w], center=true);
        }
    }    
}

module hexSupports2(w=coil_w, supp_w, supp_l=24, radius=disk_r) {
    // Create supports for bearing holder
    sectors = num_holes;
    sector_degrees = 360 / sectors;

    for(sector = [1 : 2]) {
        angle = sector_degrees * sector;
        x_pos = radius * sin(angle);
        y_pos = radius * cos(angle);
        translate([x_pos,y_pos,0]){
            rotate([0,0,-angle])cube([supp_w,supp_l,w], center=true);
        }
    }    
}

module renderTest() {
    translate([0,0,1]) {
        difference() {
            translate([6,0,0])cube([42,30,2], center=true);
            
            //Big Magnet hole
            translate([-10,-10,0])hole(mag1_w, mag1_hole_r+eps); 

            //Coil hole
            translate([0,0,0])coilHolderHole();
            
            //Small Magnet hole
            translate([10,10,0])hole(mag2_w, mag2_hole_r+eps); 
            
            //Alignment bolt hole
            translate([-10,10,0])hole(base_w, alignment_bolt_r);
            
            //Coil Center Hole
            translate([18,0,0])hole(coil_w, coil_center_hole_r);
        }
    }
    translate([38,0,0])coilHolder();
    translate([-23,0,axel_h/2])axel();
}
